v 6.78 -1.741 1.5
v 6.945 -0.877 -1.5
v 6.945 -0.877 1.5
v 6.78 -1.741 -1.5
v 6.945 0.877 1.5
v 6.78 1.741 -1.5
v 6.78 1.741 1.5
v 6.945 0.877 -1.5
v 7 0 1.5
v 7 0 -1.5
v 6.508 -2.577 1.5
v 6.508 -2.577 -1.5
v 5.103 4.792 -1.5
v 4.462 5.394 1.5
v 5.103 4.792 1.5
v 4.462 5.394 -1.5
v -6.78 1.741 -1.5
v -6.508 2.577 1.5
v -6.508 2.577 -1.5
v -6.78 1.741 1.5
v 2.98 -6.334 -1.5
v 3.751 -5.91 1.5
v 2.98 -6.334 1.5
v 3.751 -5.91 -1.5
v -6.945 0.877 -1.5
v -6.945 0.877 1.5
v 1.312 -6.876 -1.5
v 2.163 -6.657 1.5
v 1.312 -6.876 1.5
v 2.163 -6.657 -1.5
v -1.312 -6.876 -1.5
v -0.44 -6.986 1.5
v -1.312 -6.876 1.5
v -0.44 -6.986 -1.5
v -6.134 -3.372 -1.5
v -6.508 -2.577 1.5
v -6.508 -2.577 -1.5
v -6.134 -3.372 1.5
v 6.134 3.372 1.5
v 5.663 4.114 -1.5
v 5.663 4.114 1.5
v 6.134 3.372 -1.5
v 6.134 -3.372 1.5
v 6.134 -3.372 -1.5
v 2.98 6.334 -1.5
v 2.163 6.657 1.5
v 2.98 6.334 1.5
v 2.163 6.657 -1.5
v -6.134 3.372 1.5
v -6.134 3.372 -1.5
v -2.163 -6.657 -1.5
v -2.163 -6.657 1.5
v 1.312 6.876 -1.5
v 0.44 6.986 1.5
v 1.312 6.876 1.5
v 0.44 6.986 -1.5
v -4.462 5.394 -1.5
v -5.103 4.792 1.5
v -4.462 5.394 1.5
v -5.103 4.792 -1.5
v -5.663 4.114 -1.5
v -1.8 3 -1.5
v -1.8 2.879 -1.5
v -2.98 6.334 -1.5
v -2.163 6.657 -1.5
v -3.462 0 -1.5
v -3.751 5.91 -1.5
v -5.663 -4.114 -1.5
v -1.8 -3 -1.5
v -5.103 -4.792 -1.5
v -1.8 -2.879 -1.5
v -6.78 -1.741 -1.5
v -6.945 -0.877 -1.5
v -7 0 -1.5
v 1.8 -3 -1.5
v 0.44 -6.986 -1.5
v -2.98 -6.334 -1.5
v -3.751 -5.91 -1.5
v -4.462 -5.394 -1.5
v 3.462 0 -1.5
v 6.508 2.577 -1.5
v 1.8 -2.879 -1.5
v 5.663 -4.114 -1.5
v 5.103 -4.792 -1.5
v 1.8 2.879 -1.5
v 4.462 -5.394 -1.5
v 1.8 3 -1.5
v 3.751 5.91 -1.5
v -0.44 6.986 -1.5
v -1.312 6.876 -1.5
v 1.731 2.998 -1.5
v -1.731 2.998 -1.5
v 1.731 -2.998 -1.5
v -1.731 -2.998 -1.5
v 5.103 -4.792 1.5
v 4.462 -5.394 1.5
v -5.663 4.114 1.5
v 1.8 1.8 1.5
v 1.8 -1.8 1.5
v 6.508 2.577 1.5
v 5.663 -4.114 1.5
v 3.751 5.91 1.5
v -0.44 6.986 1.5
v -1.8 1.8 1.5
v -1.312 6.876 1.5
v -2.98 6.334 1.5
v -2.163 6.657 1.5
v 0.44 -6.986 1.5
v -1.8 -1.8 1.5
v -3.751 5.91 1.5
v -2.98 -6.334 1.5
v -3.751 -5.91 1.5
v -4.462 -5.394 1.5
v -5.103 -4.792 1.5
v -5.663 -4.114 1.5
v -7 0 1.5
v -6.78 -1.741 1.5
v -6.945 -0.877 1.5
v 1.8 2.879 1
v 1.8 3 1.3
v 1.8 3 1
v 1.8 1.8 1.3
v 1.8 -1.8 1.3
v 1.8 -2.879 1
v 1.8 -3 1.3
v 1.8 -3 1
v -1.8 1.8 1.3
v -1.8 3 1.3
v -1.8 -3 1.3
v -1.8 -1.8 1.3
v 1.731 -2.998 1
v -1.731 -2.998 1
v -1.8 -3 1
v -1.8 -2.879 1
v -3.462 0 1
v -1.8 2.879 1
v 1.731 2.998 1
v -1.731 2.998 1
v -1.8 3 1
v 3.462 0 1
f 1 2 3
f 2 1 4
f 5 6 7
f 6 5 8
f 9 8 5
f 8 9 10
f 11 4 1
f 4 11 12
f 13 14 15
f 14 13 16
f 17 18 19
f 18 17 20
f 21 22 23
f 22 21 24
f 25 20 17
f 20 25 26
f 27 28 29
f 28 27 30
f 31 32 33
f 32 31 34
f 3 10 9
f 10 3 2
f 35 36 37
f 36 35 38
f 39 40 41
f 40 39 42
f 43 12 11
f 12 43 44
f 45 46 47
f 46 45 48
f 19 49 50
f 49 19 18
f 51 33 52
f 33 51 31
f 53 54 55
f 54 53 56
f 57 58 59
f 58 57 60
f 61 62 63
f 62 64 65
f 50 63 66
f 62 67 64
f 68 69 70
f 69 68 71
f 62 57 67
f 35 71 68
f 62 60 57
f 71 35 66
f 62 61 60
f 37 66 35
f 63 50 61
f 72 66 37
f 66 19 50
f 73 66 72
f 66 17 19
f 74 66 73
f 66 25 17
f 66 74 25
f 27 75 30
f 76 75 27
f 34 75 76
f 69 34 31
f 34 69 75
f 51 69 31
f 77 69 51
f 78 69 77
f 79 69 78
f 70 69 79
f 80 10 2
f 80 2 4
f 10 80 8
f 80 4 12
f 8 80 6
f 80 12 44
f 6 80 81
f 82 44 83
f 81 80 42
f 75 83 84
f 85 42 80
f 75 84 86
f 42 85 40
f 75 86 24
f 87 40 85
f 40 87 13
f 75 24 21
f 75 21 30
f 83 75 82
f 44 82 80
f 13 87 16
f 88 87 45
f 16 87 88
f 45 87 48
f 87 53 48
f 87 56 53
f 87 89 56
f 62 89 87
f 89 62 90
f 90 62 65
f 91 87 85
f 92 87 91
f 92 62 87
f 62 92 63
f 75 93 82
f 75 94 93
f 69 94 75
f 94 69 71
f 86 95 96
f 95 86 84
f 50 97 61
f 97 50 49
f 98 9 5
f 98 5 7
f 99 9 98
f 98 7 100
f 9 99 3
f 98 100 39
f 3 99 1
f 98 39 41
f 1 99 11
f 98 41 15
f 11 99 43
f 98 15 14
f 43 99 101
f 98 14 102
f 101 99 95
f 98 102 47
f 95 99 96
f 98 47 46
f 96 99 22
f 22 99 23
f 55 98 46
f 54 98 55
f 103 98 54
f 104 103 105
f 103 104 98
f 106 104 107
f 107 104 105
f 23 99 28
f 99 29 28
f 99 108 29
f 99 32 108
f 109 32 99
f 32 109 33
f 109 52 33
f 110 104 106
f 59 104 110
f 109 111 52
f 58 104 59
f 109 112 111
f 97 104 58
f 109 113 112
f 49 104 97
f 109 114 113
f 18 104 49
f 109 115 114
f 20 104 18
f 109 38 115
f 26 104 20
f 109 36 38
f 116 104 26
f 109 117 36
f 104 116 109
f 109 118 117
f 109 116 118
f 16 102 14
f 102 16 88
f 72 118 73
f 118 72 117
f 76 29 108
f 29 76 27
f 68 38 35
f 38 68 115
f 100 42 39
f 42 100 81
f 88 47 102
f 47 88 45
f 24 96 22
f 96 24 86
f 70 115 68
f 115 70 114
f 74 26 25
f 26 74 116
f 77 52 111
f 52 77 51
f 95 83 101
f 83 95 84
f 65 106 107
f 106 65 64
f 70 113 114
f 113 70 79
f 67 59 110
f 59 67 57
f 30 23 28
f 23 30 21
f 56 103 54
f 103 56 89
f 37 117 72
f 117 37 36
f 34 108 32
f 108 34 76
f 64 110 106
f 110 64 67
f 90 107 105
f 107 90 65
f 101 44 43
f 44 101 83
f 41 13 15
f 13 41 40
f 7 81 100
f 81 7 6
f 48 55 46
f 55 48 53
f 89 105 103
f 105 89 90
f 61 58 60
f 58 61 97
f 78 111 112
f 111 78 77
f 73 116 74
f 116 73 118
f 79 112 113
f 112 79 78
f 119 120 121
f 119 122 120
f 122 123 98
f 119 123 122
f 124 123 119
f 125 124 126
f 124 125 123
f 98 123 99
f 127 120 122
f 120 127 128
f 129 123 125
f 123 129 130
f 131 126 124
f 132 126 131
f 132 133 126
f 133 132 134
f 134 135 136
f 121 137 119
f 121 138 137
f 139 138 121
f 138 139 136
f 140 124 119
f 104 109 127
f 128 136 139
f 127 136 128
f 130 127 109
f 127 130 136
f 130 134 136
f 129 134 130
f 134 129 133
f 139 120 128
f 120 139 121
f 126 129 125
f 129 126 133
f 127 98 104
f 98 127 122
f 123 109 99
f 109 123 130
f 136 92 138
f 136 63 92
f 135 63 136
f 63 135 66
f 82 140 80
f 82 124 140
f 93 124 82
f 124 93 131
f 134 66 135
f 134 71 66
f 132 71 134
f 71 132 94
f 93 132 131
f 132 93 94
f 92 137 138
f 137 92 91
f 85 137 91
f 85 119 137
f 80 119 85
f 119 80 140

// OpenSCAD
$fn = 50;


difference() {
	union() {
		translate(v = [0, 0, -1.5000000000]) {
			cylinder(h = 3, r = 7.0000000000);
		}
		translate(v = [0, 0, -1.5000000000]) {
			cylinder(h = 3, r = 2.8500000000);
		}
	}
	union() {
		translate(v = [0, 0, -1.5000000000]) {
			rotate(a = [0, 0, 0]) {
				difference() {
					union() {
						translate(v = [-1.8000000000, -3.0000000000, -0.3000000000]) {
							cube(size = [3.6000000000, 6.0000000000, 0.3000000000]);
						}
						translate(v = [-1.8000000000, -1.8000000000, -0.6000000000]) {
							cube(size = [3.6000000000, 3.6000000000, 0.3000000000]);
						}
						translate(v = [-1.8000000000, -3.0000000000, 2.5000000000]) {
							cube(size = [3.6000000000, 6.0000000000, 0.3000000000]);
						}
						translate(v = [-1.8000000000, -1.8000000000, 2.8000000000]) {
							cube(size = [3.6000000000, 3.6000000000, 0.3000000000]);
						}
						linear_extrude(height = 2.5000000000) {
							polygon(points = [[3.4620000000, 0.0000000000], [1.7310000000, 2.9981799479], [-1.7310000000, 2.9981799479], [-3.4620000000, 0.0000000000], [-1.7310000000, -2.9981799479], [1.7310000000, -2.9981799479]]);
						}
						translate(v = [-1.8000000000, -3.0000000000, -0.3000000000]) {
							cube(size = [3.6000000000, 6.0000000000, 0.3000000000]);
						}
						translate(v = [-1.8000000000, -1.8000000000, -0.6000000000]) {
							cube(size = [3.6000000000, 3.6000000000, 0.3000000000]);
						}
						translate(v = [-1.8000000000, -3.0000000000, 2.5000000000]) {
							cube(size = [3.6000000000, 6.0000000000, 0.3000000000]);
						}
						translate(v = [-1.8000000000, -1.8000000000, 2.8000000000]) {
							cube(size = [3.6000000000, 3.6000000000, 0.3000000000]);
						}
						translate(v = [-1.8000000000, -3.0000000000, -0.3000000000]) {
							cube(size = [3.6000000000, 6.0000000000, 0.3000000000]);
						}
						translate(v = [-1.8000000000, -1.8000000000, -0.6000000000]) {
							cube(size = [3.6000000000, 3.6000000000, 0.3000000000]);
						}
						translate(v = [-1.8000000000, -3.0000000000, 2.5000000000]) {
							cube(size = [3.6000000000, 6.0000000000, 0.3000000000]);
						}
						translate(v = [-1.8000000000, -1.8000000000, 2.8000000000]) {
							cube(size = [3.6000000000, 3.6000000000, 0.3000000000]);
						}
					}
					union();
				}
			}
		}
		translate(v = [0, 0, -50.0000000000]) {
			cylinder(h = 100, r = 1.8000000000);
		}
	}
}
